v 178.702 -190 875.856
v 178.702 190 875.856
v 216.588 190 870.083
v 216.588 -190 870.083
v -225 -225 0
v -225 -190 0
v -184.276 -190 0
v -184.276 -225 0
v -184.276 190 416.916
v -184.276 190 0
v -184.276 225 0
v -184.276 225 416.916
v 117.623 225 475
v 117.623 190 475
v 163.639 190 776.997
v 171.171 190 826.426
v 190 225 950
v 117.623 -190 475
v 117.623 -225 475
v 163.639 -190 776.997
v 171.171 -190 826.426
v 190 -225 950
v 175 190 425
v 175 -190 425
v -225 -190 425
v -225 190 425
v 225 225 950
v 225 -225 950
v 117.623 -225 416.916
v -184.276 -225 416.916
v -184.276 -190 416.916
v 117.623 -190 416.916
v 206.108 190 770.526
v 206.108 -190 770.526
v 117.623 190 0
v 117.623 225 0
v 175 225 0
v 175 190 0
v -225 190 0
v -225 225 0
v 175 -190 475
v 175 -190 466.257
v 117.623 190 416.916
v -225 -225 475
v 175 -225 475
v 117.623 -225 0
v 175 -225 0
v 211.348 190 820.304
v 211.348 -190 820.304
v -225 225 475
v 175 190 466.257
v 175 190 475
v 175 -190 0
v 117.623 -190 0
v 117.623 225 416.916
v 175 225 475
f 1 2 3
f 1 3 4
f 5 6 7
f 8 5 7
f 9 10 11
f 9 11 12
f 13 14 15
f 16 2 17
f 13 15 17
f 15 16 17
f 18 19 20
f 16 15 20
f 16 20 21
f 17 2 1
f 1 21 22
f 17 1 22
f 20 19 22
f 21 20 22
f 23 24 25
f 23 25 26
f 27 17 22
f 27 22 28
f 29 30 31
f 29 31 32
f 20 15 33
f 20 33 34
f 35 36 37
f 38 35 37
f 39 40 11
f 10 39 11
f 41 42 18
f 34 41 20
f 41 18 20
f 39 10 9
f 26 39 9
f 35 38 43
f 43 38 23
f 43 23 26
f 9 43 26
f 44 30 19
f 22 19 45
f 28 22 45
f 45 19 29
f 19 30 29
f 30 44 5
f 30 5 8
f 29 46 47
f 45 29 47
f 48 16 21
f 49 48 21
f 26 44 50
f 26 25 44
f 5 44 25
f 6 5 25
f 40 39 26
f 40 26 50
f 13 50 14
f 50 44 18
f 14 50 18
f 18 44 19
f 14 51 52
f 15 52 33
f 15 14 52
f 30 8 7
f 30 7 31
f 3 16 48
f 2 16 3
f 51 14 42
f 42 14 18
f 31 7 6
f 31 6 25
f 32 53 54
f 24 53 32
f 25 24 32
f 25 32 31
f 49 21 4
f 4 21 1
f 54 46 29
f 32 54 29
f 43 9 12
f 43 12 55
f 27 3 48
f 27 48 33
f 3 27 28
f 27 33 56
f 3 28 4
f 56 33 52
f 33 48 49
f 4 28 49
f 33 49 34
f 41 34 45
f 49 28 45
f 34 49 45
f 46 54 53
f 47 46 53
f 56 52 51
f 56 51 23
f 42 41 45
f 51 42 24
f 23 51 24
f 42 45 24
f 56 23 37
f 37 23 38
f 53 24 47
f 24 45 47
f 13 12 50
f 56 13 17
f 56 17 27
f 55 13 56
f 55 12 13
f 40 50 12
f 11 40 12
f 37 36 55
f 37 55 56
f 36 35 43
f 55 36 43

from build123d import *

# Parameters (mm, degrees)
F0_W     = 450
F0_H     = 450
F1_DEPTH = 950
F2_W     = 50
F2_H     = 58.0840170383
F2_H_2   = 416.9159829617
F2_W_2   = 301.8988892436
F3_DEPTH = 450.001
F4_W     = 380
F4_H     = 425
F5_DEPTH = 400.001
F6_W     = 380
F6_H     = 50
F6_H_2   = 305.4825048688
F7_DEPTH = 177.7040327035


with BuildPart() as f1:
    # F0 (on Top) → F1 (new body)
    with BuildSketch(Plane.XY):
        Rectangle(F0_W, F0_H)
    extrude(amount=F1_DEPTH)

    # F2 (on face) → F3 (cut, through all)
    with BuildSketch(Plane.XZ.offset(225)):
        with Locations((200, 445.9579914808)):
            Rectangle(F2_W, F2_H)
        Polygon((-225, 475), (117.622949183, 475), (190, 950), (-225, 950), align=None)
        Polygon((175, 475), (225, 475), (225, 950), align=None)
        with Locations((200, 208.4579914808)):
            Rectangle(F2_W, F2_H_2)
        with Locations((-33.3264954388, 208.4579914808)):
            Rectangle(F2_W_2, F2_H_2)
    extrude(amount=-F3_DEPTH, mode=Mode.SUBTRACT)

    # F4 (on face) → F5 (cut, through all)
    with BuildSketch(Plane.YZ.offset(175)):
        with Locations((0, 212.5)):
            Rectangle(F4_W, F4_H)
    extrude(amount=-F5_DEPTH, mode=Mode.SUBTRACT)

    # F6 (on face) → F7 (cut, through all)
    with BuildSketch(Plane(origin=(44.2192403008, 0, -6.7378067418), x_dir=(0, -1, 0), z_dir=(-0.9885895848, 0, 0.1506341024))):
        with Locations((0, 867.780585023)):
            Rectangle(F6_W, F6_H)
        with Locations((0, 640.0393325886)):
            Rectangle(F6_W, F6_H_2)
    extrude(amount=-F7_DEPTH, mode=Mode.SUBTRACT)


solid = f1.part
